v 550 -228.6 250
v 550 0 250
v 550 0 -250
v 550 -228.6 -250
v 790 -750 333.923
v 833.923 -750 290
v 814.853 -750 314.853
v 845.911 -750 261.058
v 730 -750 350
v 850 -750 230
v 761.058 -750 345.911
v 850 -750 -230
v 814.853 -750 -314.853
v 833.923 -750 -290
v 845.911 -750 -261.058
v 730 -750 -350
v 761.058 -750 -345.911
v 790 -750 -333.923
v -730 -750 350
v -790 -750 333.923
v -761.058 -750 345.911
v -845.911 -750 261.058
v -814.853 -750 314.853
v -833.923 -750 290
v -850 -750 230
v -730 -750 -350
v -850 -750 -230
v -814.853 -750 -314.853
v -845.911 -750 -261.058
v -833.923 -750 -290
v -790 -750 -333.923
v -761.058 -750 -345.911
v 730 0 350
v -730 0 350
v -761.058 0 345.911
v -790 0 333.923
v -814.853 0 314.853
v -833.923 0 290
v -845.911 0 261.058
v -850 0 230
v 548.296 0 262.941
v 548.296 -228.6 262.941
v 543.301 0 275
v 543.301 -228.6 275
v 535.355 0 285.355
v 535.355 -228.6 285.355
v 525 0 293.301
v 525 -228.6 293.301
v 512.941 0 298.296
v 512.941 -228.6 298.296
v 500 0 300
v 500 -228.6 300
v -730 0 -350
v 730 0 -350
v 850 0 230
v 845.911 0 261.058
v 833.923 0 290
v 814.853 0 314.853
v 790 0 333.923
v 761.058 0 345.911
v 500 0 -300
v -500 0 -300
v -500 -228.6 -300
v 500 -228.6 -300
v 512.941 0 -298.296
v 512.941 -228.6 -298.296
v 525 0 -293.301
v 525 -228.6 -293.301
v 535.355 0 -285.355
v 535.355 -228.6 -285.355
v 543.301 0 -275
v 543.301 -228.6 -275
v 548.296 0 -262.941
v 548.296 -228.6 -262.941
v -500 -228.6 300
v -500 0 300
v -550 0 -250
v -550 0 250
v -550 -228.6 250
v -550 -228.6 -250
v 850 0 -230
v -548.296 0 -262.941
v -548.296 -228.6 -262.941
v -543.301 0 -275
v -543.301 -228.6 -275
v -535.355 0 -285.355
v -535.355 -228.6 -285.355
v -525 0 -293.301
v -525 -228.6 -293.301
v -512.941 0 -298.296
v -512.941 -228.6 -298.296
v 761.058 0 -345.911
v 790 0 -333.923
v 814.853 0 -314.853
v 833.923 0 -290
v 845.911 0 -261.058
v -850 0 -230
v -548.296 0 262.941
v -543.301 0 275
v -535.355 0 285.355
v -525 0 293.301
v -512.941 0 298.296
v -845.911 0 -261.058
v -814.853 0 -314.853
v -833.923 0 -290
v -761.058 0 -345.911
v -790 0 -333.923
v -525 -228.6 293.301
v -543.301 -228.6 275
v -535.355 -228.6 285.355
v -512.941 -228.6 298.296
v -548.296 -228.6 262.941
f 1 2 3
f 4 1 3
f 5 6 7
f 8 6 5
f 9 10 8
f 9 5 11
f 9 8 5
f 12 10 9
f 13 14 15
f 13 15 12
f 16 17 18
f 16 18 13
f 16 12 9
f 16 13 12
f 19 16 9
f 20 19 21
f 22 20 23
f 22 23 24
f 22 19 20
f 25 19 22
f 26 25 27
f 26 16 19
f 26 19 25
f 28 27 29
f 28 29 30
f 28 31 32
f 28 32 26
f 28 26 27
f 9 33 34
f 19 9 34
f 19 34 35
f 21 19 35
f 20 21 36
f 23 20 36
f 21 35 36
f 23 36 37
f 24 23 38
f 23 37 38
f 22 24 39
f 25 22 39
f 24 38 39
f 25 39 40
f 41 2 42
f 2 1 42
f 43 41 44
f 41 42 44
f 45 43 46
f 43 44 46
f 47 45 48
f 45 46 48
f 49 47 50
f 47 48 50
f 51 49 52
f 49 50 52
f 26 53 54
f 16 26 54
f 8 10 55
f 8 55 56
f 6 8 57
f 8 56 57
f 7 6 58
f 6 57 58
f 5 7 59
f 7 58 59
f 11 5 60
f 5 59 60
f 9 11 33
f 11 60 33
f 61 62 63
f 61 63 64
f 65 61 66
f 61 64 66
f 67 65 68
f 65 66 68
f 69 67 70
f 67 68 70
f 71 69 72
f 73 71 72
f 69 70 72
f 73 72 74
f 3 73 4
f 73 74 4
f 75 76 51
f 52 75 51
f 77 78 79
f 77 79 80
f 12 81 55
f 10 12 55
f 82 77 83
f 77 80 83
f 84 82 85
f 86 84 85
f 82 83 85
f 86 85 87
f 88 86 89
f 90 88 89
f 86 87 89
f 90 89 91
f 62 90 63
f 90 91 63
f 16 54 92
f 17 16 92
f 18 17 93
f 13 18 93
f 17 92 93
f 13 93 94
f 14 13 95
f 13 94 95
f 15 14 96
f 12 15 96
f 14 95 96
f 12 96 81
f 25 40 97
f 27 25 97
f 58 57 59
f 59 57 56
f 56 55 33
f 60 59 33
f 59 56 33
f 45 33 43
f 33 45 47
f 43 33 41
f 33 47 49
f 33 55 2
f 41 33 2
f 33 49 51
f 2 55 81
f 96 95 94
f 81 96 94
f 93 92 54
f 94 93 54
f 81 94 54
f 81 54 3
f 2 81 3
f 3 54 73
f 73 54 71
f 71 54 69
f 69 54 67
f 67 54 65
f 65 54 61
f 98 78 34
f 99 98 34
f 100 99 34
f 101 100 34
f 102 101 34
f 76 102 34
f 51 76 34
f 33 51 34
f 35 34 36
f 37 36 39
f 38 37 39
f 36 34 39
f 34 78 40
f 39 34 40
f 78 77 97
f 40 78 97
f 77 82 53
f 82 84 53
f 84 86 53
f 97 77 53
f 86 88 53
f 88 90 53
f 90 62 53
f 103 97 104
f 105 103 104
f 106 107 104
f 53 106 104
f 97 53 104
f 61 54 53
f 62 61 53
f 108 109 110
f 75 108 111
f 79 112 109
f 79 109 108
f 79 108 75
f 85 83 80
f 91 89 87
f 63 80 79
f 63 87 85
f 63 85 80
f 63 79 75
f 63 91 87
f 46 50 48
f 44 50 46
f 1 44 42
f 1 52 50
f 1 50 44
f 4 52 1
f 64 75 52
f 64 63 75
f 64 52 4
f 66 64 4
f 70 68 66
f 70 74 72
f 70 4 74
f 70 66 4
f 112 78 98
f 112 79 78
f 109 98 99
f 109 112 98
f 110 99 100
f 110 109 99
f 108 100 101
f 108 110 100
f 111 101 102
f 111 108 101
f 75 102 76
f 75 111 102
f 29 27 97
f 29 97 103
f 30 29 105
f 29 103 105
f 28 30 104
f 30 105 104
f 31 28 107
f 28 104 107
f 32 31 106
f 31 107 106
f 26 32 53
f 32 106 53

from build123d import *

# Parameters (mm, degrees)
BOSS_EXTRUDE1_DEPTH = 750
SKETCH1_3_W         = 1100
SKETCH1_3_H         = 600
CUT_EXTRUDE1_DEPTH  = 228.6
FILLET1_R           = 50.000000076


with BuildPart() as part:
    # Sketch1 → Boss-Extrude1 (new body)
    with BuildSketch(Plane(origin=(0, 0, 0), x_dir=(1, 0, 0), z_dir=(0, 1, 0))):
        with BuildLine():
            Line((730, 350), (-730, 350))
            ThreePointArc((-730, 350), (-814.852813742, 314.852813742), (-850, 230))
            Line((-850, 230), (-850, -230))
            ThreePointArc((-850, -230), (-814.852813742, -314.852813742), (-730, -350))
            Line((-730, -350), (730, -350))
            ThreePointArc((730, -350), (814.852813742, -314.852813742), (850, -230))
            Line((850, -230), (850, 230))
            ThreePointArc((850, 230), (814.852813742, 314.852813742), (730, 350))
        make_face()
    extrude(amount=-BOSS_EXTRUDE1_DEPTH)

    # Sketch1<3> → Cut-Extrude1 (cut)
    with BuildSketch(Plane(origin=(0, 0, 0), x_dir=(1, 0, 0), z_dir=(0, 1, 0))):
        Rectangle(SKETCH1_3_W, SKETCH1_3_H)
    extrude(amount=-CUT_EXTRUDE1_DEPTH, mode=Mode.SUBTRACT)

    # Fillet1
    fillet1_edges = [part.edges().sort_by_distance(p)[0] for p in [
        (550, -114.3, 300),
        (-550, -114.3, 300),
        (550, -114.3, -300),
        (-550, -114.3, -300),
    ]]
    fillet(fillet1_edges, radius=FILLET1_R)


solid = part.part
